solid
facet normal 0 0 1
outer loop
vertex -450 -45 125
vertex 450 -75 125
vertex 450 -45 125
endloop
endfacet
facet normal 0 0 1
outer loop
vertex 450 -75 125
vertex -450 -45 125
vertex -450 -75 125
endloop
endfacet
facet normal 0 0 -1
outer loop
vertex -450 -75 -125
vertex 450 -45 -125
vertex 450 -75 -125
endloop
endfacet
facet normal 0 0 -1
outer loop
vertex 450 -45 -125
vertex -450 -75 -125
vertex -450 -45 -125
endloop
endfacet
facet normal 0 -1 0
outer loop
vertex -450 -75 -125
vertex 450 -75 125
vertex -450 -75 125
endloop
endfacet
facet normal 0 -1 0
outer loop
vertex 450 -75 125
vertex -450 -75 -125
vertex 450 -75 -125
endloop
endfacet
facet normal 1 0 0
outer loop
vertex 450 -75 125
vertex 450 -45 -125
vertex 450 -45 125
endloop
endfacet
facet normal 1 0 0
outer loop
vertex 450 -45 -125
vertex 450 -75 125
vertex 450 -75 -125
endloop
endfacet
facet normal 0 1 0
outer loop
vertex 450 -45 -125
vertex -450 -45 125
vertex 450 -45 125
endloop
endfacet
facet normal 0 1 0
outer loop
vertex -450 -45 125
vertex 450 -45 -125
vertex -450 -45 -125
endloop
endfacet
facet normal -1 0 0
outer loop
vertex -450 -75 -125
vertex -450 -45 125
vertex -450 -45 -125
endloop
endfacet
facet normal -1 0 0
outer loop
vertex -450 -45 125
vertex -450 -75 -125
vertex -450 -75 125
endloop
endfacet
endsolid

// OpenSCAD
module vacuum_tube(
    main_height = 300, 
    main_radius = 80, 
    bell_radius = 40, 
    bell_angle = 70, 
    tip_height = 30, 
    tip_top_angle = -80
) {

    steps = $fn ? $fn : 10;

    bell_end = [cos(bell_angle) * main_radius, sin(bell_angle) * bell_radius];
    tip_bottom_angle = atan(tan(bell_angle) * bell_radius / main_radius);

    tip_end = [0, tip_height + sin(bell_angle) * bell_radius];

    main_points = [[0, -main_height], [main_radius, -main_height], [main_radius, 0]];

    shoulder_points = [ for(a = [0:bell_angle / steps:bell_angle]) arc_point(main_radius, bell_radius, a)];

    p1 = intersecting_point(tip_end, tip_top_angle, bell_end, tip_bottom_angle);

    tip_points = [ for(t = [0:1/steps:1]) bezier_point(bell_end, p1, tip_end, t) ];

    points = concat(main_points, shoulder_points, tip_points, [[0,0]] );

    translate([0,0, main_height]) rotate_extrude(convexity=2) {
        polygon(points);
    }
}

function bezier_point(p0, p1, p2, t) = pow(1 - t, 2) * p0 + 2 * t * (1 - t) * p1 + pow(t,2) * p2;

function intersecting_point(p0, a0, p1, a1) = 
    let(x = p0[0] + (p1[1] - p0[1]) / (tan(a0) - tan(a1))) 
    echo(a0, a1)
    [x, tan(a0) * (x - p0[0]) + p0[1]];

function arc_point(rx, ry, angle) = [rx * cos(angle), ry * sin(angle)];

module fillet(r, h) {
    translate([r / 2, r / 2, 0])

        difference() {
            cube([r + 0.01, r + 0.01, h], center = true);

            translate([r/2, r/2, 0])
                cylinder(r = r, h = h + 1, center = true);

        }
}

module tube() {
    //Grid
    color("red", 0.50) translate([0,150,0]) cube([100, 200, 100], true);

    //Tube
    color("grey", 0.25) rotate([-90, 0, 0]) vacuum_tube($fn = 100);

    //Stand
    color("blue") rotate([90, 0, 0]) cylinder(r = 90, h = 60, $fn = 100);
}

// Tubo coordenadas modelo
//tube();

// Tubos en el mundo
// translate([-310, 0, 0]) tube();
// translate([-110, 0, 0]) tube();
// translate([110, 0, 0]) tube();
// translate([310, 0, 0]) tube();

translate([0, -60, 0]) cube([900, 30, 250], center= true);

//color("yellow") fillet(10, 20);
